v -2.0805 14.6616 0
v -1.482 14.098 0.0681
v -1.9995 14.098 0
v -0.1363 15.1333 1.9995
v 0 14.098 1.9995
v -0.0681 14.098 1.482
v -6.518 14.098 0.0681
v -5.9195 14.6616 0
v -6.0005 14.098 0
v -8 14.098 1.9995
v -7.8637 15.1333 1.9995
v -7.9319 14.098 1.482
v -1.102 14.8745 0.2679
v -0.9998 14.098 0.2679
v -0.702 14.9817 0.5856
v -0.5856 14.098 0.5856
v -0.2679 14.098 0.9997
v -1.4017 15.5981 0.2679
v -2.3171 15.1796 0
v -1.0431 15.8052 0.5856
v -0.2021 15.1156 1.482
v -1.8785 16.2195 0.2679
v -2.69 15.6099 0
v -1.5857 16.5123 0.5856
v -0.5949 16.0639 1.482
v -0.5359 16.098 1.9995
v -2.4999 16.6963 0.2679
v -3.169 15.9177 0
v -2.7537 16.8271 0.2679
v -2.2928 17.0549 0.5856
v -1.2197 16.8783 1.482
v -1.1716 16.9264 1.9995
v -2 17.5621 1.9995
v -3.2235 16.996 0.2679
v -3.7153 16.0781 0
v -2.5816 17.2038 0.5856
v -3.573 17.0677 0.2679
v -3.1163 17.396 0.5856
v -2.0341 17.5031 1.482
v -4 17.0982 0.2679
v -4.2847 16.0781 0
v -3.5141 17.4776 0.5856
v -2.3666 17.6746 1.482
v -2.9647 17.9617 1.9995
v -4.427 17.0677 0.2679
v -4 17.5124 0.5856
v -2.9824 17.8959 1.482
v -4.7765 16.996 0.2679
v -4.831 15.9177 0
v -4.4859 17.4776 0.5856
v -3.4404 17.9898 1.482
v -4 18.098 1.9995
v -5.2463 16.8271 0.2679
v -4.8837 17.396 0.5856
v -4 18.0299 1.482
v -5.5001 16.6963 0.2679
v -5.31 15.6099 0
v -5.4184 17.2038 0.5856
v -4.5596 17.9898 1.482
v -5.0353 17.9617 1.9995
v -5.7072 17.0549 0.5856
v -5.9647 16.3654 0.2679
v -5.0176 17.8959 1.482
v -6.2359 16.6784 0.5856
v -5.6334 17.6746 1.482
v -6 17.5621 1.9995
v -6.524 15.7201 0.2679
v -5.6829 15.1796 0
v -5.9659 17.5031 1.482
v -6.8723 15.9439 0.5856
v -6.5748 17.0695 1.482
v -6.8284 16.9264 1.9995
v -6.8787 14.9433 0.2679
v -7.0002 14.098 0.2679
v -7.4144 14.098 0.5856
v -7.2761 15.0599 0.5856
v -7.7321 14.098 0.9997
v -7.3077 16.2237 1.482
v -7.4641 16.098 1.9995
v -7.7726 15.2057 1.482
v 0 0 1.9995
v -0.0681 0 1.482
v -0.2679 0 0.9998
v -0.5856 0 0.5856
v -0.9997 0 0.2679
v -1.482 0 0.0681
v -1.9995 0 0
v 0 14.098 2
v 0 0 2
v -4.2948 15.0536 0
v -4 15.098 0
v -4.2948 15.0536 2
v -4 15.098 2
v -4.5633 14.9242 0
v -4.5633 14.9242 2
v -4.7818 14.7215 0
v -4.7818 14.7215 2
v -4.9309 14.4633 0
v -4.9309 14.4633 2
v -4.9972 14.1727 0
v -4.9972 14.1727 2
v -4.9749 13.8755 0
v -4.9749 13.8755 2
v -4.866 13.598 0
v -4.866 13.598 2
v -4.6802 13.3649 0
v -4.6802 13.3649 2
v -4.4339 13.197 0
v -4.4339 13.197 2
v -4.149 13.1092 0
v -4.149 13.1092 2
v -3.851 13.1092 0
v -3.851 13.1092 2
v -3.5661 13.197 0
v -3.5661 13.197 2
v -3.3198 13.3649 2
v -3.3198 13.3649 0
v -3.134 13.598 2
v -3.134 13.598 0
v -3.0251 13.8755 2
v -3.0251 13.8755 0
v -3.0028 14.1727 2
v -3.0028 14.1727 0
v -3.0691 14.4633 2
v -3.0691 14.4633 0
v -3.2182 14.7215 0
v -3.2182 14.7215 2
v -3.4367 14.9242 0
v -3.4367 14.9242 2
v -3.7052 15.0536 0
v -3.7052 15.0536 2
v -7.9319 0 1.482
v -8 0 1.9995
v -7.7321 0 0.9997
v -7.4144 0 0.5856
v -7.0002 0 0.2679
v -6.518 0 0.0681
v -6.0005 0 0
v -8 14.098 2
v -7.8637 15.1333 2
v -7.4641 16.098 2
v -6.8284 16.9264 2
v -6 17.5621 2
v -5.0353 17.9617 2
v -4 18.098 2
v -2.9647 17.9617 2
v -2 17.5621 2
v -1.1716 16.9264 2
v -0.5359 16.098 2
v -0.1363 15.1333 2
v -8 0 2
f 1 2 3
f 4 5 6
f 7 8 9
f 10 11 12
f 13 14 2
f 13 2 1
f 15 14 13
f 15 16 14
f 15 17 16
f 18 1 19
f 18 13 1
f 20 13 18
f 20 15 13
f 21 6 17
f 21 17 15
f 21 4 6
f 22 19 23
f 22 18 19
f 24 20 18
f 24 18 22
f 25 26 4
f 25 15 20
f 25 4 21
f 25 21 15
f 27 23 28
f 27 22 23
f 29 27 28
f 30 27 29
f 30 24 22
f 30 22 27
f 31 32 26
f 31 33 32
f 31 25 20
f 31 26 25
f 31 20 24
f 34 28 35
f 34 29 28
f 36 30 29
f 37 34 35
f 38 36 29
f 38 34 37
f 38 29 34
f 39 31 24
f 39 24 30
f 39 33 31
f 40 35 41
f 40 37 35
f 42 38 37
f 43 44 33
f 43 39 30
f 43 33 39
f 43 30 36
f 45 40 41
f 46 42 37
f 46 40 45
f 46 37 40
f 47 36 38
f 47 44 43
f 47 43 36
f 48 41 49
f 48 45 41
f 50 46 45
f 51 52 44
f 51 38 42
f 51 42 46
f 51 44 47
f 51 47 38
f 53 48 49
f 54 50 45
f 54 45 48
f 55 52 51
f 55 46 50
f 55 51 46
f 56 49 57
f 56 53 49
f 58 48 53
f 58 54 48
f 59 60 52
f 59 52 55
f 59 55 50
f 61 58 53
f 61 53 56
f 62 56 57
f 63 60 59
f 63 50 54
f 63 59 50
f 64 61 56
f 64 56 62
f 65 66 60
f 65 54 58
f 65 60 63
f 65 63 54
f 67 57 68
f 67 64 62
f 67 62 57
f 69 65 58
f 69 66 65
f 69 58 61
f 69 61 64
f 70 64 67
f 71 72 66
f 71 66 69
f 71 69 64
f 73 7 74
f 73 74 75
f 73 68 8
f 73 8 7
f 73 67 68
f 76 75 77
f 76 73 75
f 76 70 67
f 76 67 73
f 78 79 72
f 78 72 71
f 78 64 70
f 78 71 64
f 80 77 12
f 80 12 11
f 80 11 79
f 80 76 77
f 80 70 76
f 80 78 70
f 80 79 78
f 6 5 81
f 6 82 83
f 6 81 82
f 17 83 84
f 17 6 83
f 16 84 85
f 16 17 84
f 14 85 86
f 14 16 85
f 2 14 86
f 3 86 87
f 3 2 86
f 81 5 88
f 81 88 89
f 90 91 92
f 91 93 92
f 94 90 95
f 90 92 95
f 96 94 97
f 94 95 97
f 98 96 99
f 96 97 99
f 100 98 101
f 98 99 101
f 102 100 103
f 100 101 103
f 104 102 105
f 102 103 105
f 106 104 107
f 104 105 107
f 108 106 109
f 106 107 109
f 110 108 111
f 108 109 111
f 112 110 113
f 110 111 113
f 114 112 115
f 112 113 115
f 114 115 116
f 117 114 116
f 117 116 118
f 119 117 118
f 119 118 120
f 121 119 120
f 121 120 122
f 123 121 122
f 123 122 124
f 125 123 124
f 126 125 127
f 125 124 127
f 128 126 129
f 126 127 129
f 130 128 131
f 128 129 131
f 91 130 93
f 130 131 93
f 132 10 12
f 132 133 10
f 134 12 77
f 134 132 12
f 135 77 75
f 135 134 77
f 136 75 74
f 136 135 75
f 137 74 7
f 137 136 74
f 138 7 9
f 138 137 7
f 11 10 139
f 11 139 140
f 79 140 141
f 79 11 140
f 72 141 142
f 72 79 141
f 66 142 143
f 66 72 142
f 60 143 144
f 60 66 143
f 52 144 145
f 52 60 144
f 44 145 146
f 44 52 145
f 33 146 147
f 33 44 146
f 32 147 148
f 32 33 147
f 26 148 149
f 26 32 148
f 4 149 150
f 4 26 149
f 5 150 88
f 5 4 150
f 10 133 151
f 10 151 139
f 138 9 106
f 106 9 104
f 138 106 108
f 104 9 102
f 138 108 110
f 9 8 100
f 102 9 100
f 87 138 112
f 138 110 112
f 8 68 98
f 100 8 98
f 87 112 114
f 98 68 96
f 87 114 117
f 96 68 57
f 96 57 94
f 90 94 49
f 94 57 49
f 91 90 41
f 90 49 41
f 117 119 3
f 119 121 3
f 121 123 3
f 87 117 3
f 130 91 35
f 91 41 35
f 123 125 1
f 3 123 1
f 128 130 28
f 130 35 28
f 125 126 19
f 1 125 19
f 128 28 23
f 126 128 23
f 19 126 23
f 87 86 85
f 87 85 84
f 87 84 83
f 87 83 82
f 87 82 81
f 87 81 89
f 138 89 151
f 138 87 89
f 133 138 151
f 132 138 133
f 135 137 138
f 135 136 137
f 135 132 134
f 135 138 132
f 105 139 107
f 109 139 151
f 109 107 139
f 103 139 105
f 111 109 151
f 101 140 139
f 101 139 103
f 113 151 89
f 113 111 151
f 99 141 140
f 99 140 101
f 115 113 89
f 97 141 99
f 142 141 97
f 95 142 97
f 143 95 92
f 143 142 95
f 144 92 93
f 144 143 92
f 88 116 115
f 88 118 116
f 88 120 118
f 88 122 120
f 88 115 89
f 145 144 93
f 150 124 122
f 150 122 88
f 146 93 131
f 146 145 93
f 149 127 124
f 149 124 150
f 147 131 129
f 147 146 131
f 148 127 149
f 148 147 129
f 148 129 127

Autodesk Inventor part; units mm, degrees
ref_plane "YZ Plane" through (0, 0, 0) normal (1, 0, 0) x (0, 1, 0)
ref_plane "XZ Plane" through (0, 0, 0) normal (0, 1, 0) x (-1, 0, 0)
ref_plane "XY Plane" through (0, 0, 0) normal (0, 0, 1) x (1, 0, 0)
sketch "Szkic1" plane through (0, 0, 0) normal (0, 0, 1) x (1, 0, 0)
  line L0 (-9.6, 0) -> (1.6, 0) construction
  line L1 (0, -3.6196) -> (0, 21.7176) construction
  line L2 (0, 0) -> (-8, 0)
  line L3 (-8, 0) -> (-8, 14.098)
  line L4 (-8, 14.098) -> (0, 14.098)
  line L5 (0, 14.098) -> (0, 0)
  circle A0 centre (-4, 14.098) radius 4
  dimension "d1" = 8
  dimension "d2" = 14.098
extrude "Wyciągnięcie proste1" add sketch "Szkic1" along normal blind 2
hole "Otwór1" at (-4, 14.098, 0) direction (0, 0, 1) diameter 2 end through all
fillet "Zaokrąglenie1" radius 2 3 edges at (-4, 18.098, 0) (-8, 7.049, 0) (0, 7.049, 0)
properties part number "podpora"
